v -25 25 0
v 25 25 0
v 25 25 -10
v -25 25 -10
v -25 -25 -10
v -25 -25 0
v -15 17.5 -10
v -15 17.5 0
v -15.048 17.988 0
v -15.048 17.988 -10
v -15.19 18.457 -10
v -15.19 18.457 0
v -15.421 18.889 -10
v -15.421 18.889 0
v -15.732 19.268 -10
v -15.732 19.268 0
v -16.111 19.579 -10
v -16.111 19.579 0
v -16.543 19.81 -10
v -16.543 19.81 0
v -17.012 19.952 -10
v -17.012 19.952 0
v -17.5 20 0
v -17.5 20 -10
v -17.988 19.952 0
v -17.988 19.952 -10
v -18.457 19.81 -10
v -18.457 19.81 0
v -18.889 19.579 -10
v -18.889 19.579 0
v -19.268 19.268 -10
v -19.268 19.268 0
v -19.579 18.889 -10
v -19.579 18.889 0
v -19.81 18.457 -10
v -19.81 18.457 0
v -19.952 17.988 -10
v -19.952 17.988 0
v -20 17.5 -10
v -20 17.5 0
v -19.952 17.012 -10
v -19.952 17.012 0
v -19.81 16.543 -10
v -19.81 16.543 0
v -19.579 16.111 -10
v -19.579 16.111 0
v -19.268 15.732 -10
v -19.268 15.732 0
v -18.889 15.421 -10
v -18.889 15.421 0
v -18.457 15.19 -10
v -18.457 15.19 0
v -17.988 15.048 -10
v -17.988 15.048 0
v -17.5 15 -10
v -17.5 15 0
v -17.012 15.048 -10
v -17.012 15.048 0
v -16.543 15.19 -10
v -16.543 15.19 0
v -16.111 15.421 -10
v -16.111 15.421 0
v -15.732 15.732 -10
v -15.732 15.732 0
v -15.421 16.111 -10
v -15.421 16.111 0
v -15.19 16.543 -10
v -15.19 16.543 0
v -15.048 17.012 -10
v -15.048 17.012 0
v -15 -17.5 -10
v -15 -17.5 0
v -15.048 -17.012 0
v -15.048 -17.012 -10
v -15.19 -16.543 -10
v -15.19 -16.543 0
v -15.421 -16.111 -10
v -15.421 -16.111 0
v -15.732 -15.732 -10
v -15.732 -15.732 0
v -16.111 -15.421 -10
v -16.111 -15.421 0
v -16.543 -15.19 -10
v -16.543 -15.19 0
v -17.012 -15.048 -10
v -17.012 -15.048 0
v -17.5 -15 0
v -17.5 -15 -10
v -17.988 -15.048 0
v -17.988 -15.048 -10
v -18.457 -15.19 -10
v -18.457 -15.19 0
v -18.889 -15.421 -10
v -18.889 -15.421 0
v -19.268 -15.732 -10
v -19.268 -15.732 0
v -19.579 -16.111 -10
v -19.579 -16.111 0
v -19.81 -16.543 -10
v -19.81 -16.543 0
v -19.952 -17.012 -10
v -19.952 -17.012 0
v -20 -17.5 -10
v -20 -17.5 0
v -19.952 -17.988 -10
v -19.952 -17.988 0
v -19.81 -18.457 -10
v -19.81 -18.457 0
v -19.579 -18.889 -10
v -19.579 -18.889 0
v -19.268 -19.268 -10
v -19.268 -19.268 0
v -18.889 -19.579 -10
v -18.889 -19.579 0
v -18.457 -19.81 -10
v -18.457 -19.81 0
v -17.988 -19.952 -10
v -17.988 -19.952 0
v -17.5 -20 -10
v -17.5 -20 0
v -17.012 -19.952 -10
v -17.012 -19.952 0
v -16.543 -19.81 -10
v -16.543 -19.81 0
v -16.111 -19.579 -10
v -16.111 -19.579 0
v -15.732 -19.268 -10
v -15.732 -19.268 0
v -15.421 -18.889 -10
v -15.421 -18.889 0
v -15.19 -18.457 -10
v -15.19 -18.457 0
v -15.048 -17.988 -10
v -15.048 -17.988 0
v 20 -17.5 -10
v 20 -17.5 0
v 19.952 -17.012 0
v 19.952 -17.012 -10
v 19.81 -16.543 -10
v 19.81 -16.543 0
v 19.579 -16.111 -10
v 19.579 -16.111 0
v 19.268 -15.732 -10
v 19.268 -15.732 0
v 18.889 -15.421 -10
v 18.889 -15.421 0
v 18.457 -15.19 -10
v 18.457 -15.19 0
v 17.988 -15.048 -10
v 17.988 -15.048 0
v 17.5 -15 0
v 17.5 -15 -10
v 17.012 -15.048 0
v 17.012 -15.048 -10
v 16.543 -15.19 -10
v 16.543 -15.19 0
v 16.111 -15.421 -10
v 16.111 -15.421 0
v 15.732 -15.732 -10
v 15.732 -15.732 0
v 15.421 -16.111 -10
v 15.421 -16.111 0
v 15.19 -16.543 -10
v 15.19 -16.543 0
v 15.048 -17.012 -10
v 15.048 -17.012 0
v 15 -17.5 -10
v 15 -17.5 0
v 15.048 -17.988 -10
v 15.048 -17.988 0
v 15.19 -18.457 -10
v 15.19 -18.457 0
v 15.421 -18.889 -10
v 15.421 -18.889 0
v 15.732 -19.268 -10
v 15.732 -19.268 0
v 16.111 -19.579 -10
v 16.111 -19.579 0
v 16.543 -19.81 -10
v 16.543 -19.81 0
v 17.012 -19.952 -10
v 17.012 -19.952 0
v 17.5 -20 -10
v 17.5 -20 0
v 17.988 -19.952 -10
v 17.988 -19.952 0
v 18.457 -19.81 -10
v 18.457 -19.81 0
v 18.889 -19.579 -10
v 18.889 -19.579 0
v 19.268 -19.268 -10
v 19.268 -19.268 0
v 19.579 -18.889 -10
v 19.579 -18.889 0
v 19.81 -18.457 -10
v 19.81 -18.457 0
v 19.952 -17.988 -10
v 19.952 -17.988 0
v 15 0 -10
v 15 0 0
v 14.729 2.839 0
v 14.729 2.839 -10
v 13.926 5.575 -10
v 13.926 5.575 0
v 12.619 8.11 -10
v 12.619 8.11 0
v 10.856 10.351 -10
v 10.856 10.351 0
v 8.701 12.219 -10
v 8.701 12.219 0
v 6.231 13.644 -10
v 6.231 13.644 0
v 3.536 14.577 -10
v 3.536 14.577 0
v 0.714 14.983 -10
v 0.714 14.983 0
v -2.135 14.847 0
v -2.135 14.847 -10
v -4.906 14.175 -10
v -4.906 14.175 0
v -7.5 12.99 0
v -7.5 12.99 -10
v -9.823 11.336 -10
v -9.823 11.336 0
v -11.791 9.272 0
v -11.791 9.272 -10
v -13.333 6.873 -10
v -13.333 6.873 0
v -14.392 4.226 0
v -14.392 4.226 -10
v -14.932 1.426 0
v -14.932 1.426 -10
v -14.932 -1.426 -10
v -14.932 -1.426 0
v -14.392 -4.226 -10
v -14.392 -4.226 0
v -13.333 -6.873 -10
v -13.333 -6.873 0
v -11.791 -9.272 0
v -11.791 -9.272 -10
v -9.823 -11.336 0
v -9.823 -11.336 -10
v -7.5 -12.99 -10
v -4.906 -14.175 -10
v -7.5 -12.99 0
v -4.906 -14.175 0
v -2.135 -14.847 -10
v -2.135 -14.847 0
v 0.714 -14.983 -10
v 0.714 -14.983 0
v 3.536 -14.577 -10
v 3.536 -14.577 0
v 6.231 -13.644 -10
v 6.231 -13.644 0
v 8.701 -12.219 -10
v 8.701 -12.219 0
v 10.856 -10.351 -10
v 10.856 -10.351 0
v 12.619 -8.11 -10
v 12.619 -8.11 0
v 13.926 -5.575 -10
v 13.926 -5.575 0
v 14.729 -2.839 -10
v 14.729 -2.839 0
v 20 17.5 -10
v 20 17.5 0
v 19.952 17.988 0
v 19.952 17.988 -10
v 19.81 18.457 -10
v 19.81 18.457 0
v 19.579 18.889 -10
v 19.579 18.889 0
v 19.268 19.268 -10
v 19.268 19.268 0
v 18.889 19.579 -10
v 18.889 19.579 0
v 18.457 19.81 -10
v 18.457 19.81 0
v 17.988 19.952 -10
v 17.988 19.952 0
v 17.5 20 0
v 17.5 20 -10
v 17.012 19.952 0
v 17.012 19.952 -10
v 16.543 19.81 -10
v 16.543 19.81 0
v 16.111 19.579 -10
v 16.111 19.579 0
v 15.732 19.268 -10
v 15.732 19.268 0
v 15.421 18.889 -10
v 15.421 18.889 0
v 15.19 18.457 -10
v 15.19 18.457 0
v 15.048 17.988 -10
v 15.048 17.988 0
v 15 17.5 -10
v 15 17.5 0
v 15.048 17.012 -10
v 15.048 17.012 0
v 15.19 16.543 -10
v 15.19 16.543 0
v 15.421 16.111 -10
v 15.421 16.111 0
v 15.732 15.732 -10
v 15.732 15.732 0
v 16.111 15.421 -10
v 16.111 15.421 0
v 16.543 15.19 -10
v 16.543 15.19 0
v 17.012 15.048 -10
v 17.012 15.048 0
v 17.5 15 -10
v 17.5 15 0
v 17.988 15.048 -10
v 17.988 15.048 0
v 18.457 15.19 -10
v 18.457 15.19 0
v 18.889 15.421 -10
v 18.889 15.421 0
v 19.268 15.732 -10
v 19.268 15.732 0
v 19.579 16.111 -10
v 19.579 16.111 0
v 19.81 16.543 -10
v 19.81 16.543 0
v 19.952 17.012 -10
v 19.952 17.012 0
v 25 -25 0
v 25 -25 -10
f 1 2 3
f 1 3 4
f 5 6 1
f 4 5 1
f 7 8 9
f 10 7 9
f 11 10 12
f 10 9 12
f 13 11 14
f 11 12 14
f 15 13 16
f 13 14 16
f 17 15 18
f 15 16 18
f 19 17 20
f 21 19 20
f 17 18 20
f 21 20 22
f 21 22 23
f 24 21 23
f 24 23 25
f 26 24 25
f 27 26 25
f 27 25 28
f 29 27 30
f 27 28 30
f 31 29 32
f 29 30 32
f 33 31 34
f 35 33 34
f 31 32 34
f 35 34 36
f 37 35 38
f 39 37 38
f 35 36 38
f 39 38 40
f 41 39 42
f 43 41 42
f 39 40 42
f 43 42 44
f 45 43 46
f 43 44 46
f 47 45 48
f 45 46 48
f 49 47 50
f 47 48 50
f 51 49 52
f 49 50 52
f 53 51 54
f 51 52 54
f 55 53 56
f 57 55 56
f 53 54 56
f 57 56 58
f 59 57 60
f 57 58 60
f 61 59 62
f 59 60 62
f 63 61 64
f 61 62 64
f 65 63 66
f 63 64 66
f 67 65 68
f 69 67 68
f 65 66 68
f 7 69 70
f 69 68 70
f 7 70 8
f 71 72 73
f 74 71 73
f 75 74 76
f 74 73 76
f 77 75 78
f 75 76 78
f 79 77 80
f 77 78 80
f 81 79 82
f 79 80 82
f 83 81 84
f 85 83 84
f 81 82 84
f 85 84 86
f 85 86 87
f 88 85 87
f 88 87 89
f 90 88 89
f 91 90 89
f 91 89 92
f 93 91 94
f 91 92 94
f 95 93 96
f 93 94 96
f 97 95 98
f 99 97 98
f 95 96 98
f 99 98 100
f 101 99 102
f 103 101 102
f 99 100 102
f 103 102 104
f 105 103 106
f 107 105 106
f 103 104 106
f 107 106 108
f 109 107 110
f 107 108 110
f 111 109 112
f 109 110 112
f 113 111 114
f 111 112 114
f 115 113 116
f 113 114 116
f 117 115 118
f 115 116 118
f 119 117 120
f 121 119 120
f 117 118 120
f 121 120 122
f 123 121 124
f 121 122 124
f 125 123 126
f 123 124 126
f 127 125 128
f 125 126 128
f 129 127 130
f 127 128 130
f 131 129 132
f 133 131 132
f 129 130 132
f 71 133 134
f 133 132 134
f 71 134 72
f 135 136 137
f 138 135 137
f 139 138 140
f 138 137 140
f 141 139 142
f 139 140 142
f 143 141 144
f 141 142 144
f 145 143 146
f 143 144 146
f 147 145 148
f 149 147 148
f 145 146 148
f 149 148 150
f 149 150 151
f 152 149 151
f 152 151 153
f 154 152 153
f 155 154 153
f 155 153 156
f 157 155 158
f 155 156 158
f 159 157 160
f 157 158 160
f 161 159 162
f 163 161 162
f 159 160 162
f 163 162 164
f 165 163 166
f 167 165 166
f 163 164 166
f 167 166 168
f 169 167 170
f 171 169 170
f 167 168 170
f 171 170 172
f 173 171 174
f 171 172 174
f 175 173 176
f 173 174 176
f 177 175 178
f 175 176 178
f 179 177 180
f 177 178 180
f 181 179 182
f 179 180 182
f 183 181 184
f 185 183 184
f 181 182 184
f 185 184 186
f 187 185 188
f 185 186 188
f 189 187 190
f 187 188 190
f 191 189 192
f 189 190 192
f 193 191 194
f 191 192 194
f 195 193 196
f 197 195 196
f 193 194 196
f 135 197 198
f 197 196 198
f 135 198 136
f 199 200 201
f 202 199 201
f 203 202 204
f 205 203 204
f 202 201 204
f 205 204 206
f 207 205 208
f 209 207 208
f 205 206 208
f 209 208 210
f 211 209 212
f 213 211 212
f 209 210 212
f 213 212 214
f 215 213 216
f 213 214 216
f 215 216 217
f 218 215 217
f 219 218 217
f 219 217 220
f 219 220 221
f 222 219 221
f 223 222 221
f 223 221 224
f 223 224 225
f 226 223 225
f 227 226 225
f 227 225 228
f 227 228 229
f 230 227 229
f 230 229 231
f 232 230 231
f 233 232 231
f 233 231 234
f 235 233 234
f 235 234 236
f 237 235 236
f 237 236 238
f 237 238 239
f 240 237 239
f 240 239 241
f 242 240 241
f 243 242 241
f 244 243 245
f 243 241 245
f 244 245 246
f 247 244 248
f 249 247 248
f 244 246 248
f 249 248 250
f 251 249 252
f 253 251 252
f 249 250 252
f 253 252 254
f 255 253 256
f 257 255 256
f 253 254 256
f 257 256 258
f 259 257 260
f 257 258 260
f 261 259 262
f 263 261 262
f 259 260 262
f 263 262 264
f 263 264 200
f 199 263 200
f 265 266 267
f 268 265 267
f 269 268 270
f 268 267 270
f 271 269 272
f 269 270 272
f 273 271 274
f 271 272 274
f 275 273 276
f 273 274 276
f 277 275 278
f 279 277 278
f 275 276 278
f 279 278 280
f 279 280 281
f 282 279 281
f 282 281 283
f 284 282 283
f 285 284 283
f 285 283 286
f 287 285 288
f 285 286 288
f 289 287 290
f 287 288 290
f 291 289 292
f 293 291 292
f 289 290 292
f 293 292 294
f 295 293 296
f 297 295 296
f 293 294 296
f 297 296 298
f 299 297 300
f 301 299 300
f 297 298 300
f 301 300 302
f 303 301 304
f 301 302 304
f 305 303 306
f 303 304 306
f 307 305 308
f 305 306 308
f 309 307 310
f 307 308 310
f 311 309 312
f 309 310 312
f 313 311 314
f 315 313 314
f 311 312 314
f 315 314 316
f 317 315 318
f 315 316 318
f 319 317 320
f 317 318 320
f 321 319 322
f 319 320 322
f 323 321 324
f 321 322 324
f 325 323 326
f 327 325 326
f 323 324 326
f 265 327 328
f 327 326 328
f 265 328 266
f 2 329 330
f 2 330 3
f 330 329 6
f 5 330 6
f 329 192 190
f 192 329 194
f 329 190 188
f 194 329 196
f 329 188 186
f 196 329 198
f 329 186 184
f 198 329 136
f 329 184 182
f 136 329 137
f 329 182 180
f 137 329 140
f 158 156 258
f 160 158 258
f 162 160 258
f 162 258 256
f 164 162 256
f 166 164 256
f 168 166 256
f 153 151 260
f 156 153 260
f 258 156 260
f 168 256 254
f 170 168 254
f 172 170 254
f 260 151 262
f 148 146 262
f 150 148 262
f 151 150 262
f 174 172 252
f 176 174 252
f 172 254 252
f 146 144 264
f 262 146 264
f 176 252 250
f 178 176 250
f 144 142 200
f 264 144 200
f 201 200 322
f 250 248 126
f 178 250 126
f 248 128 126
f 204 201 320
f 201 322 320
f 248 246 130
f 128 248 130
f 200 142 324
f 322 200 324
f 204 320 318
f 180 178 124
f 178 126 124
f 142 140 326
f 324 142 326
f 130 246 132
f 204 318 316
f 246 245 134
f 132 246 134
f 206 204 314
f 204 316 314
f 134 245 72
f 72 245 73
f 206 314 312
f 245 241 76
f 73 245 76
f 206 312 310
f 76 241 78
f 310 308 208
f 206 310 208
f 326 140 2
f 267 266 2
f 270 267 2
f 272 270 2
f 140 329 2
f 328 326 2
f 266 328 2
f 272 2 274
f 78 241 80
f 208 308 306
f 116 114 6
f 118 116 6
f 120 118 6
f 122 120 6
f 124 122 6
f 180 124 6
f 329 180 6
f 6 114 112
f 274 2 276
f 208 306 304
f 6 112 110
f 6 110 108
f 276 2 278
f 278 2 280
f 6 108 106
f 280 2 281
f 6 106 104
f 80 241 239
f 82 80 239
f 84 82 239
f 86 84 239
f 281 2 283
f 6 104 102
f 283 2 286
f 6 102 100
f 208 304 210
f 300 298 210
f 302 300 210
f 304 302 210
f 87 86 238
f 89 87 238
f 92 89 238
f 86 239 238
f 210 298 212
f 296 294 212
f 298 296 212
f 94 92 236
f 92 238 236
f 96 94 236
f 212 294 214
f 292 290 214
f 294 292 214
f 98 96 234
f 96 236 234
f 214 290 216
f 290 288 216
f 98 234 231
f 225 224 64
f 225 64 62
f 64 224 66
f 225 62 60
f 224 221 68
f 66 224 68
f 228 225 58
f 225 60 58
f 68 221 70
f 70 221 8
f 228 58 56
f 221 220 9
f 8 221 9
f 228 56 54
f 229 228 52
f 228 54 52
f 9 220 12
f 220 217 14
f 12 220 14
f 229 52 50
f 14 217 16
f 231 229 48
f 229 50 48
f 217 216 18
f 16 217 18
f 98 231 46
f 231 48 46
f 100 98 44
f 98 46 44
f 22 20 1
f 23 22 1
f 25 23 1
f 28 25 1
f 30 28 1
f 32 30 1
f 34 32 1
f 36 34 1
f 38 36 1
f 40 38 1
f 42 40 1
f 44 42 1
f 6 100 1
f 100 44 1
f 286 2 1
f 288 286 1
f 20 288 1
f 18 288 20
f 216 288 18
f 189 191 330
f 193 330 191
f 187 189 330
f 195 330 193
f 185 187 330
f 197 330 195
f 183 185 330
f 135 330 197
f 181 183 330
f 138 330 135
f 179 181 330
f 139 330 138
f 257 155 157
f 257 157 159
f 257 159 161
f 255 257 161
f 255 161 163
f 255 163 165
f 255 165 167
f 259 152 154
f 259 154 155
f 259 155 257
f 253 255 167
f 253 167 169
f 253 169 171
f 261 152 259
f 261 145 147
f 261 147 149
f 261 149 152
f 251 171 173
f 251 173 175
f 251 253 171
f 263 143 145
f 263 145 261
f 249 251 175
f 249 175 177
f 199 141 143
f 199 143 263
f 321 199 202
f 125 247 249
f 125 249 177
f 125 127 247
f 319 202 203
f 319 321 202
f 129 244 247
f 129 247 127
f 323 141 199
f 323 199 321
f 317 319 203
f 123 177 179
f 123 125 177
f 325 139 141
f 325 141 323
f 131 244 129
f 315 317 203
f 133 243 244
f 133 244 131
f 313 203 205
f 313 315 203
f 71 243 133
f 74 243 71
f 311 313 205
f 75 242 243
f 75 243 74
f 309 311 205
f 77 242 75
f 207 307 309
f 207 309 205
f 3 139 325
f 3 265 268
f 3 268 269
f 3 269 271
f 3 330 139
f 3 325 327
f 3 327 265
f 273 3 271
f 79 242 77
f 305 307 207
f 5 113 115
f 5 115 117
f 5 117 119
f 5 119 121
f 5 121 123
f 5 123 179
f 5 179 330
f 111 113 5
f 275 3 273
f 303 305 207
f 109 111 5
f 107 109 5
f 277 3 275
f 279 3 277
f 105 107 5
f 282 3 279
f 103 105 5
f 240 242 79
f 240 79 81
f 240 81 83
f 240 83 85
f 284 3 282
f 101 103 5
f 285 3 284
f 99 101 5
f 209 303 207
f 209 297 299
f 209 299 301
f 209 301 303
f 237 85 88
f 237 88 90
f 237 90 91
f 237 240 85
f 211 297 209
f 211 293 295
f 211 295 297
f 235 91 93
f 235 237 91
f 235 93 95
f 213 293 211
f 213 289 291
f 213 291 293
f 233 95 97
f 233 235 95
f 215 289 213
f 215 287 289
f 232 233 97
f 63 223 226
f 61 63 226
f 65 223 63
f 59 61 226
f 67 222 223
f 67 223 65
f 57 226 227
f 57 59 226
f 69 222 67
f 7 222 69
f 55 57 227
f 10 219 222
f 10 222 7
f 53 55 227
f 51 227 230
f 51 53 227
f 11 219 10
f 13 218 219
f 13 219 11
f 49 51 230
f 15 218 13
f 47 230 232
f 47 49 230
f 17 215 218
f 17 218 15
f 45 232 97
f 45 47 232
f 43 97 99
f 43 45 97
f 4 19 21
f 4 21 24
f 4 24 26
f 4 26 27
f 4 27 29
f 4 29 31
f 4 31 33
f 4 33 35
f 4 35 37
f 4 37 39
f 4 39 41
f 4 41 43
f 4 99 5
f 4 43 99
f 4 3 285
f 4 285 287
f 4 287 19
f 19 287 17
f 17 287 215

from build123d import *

# Parameters (mm, degrees)
SKETCH1_R           = 15
SKETCH1_R_2         = 10
BOSS_EXTRUDE1_DEPTH = 30
SKETCH2_W           = 50
SKETCH2_H           = 50
BOSS_EXTRUDE2_DEPTH = 10
SKETCH3_R           = 2.5
CUT_EXTRUDE1_DEPTH  = 10
SKETCH4_R           = 15
SKETCH4_R_2         = 10
CUT_EXTRUDE2_DEPTH  = 30
SKETCH5_R           = 15
CUT_EXTRUDE3_DEPTH  = 30


with BuildPart() as part:
    # Sketch1 → Boss-Extrude1 (new body)
    with BuildSketch(Plane.XY):
        Circle(SKETCH1_R)
        Circle(SKETCH1_R_2, mode=Mode.SUBTRACT)
    extrude(amount=BOSS_EXTRUDE1_DEPTH)

    # Sketch2 → Boss-Extrude2 (add)
    with BuildSketch(Plane(origin=(0, 0, 0), x_dir=(-1, 0, 0), z_dir=(0, 0, -1))):
        Rectangle(SKETCH2_W, SKETCH2_H)
    extrude(amount=BOSS_EXTRUDE2_DEPTH)

    # Sketch3 → Cut-Extrude1 (cut)
    with BuildSketch(Plane.XY):
        with Locations((-17.5, 17.5)):
            Circle(SKETCH3_R)
        with Locations((-17.5, -17.5)):
            Circle(SKETCH3_R)
        with Locations((17.5, -17.5)):
            Circle(SKETCH3_R)
        with Locations((17.5, 17.5)):
            Circle(SKETCH3_R)
    extrude(amount=-CUT_EXTRUDE1_DEPTH, mode=Mode.SUBTRACT)

    # Sketch4 → Cut-Extrude2 (cut)
    with BuildSketch(Plane.XY):
        Circle(SKETCH4_R)
        Circle(SKETCH4_R_2, mode=Mode.SUBTRACT)
    extrude(amount=CUT_EXTRUDE2_DEPTH, mode=Mode.SUBTRACT)

    # Sketch5 → Cut-Extrude3 (cut)
    with BuildSketch(Plane.XY):
        Circle(SKETCH5_R)
    extrude(amount=-CUT_EXTRUDE3_DEPTH, mode=Mode.SUBTRACT)


solid = part.part
